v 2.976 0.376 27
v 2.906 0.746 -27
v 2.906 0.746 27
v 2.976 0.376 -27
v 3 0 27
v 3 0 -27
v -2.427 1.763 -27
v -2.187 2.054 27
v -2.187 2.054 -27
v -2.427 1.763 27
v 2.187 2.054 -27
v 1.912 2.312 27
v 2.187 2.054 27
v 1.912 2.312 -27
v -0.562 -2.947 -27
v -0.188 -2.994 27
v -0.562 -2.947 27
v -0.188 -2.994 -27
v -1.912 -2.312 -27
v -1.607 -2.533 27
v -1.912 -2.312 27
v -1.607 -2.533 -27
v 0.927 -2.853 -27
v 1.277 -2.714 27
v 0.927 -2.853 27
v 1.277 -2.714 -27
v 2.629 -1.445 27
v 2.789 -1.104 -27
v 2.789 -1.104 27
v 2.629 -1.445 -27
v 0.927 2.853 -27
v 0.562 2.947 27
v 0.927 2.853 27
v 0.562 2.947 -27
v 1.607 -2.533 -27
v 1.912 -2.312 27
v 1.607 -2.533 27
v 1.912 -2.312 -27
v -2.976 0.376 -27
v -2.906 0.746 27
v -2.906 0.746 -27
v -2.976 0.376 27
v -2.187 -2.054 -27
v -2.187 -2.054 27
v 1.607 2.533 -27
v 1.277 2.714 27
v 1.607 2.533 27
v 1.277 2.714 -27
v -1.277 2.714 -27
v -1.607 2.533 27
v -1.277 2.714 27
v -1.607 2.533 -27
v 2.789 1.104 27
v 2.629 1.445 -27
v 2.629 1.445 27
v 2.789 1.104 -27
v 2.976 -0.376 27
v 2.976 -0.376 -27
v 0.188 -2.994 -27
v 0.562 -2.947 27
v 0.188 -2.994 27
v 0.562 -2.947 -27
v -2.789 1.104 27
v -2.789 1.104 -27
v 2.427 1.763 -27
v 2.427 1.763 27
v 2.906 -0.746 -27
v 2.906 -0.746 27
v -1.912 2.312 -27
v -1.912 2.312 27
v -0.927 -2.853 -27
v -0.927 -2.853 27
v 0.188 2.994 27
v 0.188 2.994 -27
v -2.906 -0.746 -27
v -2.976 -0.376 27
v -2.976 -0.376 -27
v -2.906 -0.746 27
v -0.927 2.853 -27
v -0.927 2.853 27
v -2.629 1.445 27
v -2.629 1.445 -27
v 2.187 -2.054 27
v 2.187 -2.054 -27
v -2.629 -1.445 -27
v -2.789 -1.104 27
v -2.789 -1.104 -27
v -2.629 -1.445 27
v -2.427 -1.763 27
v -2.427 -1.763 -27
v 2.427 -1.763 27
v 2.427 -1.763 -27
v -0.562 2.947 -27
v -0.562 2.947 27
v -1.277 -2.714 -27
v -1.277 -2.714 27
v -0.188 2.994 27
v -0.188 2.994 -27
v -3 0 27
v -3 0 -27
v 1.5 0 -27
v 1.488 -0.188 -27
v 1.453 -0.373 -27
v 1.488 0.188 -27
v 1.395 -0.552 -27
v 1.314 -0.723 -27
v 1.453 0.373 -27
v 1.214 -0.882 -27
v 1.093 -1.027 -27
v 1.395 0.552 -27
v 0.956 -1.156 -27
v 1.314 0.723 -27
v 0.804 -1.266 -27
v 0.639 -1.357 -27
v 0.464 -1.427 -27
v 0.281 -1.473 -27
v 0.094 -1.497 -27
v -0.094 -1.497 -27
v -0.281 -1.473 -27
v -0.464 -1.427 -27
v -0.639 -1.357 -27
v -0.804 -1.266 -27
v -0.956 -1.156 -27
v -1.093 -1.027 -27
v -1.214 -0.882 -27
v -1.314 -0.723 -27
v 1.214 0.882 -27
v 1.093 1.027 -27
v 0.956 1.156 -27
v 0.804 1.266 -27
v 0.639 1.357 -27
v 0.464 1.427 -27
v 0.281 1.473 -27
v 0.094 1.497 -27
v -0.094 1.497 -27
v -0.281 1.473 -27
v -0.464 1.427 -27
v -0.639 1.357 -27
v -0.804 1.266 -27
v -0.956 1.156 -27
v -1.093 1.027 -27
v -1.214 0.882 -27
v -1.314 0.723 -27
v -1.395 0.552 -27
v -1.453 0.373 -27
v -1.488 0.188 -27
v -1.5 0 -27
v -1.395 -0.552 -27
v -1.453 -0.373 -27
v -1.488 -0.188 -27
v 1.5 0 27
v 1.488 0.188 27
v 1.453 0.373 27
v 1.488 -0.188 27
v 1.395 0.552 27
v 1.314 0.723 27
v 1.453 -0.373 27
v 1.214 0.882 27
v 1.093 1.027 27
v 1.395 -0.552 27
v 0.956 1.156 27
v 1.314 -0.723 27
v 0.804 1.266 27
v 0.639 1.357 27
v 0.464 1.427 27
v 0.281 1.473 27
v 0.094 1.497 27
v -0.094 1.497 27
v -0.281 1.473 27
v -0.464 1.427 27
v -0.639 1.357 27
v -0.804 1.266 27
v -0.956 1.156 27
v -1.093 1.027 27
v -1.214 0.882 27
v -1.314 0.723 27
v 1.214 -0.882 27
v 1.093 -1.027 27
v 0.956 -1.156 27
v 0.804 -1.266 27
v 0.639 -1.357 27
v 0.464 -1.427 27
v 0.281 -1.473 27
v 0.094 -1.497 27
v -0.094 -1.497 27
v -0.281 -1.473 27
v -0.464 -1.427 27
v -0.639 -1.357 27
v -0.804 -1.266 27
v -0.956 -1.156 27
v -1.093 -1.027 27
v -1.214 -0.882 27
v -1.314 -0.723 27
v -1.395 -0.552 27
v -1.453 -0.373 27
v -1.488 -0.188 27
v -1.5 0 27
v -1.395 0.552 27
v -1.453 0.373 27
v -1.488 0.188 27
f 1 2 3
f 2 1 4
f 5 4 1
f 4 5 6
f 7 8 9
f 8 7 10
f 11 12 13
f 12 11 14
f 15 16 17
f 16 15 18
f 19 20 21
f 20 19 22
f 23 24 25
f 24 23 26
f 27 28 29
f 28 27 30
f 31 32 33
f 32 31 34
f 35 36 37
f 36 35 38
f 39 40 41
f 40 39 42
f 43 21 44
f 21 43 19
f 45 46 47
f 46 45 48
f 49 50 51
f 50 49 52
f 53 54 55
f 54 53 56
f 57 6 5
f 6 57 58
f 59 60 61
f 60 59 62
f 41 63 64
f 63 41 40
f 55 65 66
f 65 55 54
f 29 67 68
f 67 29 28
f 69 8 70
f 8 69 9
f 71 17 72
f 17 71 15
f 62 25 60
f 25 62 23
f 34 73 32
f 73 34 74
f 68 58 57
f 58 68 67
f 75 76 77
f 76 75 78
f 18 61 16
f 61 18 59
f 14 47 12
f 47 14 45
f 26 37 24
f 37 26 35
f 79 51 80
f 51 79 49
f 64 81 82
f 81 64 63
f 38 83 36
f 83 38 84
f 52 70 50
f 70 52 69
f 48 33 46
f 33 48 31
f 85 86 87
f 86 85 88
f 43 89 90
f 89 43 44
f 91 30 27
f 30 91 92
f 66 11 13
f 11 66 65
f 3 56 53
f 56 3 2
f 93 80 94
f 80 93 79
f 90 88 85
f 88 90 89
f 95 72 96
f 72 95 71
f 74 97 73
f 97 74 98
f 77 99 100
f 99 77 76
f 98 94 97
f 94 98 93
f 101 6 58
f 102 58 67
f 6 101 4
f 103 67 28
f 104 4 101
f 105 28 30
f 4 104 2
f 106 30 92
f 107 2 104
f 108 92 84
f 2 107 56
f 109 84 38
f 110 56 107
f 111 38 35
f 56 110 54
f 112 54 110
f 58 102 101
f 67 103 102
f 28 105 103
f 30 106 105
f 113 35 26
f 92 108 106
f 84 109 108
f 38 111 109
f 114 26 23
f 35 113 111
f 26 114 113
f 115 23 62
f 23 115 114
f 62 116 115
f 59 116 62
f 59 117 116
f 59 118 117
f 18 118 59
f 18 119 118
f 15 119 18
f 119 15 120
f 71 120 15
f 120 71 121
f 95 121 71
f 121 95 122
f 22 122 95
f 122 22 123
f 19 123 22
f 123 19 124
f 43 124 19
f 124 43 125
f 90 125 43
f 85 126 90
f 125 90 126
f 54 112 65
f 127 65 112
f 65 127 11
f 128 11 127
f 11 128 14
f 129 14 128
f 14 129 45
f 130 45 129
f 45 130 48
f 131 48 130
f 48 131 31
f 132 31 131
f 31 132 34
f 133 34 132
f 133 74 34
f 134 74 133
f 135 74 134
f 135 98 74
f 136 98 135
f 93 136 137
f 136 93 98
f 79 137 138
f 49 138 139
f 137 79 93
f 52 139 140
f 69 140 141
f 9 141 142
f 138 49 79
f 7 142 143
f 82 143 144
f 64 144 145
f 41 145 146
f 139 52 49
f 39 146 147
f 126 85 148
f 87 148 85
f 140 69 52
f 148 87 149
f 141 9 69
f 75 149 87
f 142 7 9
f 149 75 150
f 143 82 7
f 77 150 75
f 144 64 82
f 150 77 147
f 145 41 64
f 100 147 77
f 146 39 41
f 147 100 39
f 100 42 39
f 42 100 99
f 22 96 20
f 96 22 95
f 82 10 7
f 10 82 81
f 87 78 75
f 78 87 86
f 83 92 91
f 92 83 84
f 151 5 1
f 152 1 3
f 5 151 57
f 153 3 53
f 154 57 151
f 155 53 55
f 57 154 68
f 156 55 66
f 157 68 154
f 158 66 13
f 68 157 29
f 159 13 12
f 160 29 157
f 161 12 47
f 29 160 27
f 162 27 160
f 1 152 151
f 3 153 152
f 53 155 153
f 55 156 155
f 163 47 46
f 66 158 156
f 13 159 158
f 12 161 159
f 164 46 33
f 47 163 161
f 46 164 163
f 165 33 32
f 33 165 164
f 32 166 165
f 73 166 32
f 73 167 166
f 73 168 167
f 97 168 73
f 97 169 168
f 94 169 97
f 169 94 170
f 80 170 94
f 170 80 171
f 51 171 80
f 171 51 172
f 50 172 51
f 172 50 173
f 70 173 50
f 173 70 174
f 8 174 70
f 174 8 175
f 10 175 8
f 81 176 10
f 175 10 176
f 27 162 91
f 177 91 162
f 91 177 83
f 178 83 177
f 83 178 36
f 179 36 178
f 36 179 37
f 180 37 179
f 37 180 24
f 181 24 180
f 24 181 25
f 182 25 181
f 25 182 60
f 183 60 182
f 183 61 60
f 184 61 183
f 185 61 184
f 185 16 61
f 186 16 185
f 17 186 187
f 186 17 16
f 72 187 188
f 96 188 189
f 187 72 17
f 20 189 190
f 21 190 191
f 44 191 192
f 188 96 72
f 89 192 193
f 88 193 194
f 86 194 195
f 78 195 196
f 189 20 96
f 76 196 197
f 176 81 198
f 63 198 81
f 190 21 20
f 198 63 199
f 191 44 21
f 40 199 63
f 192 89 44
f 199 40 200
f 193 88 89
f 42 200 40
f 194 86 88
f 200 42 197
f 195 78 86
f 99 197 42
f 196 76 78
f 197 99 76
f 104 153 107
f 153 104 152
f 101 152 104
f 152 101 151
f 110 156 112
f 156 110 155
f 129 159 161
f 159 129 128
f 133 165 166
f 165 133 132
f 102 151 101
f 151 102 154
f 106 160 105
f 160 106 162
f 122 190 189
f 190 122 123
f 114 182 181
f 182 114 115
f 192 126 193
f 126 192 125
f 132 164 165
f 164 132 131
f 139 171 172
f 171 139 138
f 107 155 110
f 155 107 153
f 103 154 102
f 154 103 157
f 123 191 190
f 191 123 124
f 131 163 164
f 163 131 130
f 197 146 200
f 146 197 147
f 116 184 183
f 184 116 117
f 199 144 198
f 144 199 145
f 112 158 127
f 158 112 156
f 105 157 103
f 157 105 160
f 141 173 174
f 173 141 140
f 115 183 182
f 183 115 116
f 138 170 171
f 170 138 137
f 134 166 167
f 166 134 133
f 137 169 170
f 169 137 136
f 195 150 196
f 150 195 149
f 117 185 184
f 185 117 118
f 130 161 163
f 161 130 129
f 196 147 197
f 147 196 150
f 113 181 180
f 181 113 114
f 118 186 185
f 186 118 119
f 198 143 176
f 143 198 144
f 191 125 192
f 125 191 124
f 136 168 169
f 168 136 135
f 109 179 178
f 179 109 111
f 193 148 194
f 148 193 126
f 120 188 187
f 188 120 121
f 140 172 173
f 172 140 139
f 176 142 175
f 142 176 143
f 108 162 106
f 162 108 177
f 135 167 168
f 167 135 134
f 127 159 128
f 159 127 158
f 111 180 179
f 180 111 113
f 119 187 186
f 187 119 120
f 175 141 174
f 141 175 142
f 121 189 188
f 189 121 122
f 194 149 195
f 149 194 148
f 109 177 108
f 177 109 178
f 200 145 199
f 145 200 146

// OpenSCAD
$fn = 50;


difference() {
	union() {
		translate(v = [0, 0, -27.0000000000]) {
			cylinder(h = 54, r = 3.0000000000);
		}
	}
	union() {
		translate(v = [0, 0, -100.0000000000]) {
			cylinder(h = 200, r = 1.5000000000);
		}
	}
}
